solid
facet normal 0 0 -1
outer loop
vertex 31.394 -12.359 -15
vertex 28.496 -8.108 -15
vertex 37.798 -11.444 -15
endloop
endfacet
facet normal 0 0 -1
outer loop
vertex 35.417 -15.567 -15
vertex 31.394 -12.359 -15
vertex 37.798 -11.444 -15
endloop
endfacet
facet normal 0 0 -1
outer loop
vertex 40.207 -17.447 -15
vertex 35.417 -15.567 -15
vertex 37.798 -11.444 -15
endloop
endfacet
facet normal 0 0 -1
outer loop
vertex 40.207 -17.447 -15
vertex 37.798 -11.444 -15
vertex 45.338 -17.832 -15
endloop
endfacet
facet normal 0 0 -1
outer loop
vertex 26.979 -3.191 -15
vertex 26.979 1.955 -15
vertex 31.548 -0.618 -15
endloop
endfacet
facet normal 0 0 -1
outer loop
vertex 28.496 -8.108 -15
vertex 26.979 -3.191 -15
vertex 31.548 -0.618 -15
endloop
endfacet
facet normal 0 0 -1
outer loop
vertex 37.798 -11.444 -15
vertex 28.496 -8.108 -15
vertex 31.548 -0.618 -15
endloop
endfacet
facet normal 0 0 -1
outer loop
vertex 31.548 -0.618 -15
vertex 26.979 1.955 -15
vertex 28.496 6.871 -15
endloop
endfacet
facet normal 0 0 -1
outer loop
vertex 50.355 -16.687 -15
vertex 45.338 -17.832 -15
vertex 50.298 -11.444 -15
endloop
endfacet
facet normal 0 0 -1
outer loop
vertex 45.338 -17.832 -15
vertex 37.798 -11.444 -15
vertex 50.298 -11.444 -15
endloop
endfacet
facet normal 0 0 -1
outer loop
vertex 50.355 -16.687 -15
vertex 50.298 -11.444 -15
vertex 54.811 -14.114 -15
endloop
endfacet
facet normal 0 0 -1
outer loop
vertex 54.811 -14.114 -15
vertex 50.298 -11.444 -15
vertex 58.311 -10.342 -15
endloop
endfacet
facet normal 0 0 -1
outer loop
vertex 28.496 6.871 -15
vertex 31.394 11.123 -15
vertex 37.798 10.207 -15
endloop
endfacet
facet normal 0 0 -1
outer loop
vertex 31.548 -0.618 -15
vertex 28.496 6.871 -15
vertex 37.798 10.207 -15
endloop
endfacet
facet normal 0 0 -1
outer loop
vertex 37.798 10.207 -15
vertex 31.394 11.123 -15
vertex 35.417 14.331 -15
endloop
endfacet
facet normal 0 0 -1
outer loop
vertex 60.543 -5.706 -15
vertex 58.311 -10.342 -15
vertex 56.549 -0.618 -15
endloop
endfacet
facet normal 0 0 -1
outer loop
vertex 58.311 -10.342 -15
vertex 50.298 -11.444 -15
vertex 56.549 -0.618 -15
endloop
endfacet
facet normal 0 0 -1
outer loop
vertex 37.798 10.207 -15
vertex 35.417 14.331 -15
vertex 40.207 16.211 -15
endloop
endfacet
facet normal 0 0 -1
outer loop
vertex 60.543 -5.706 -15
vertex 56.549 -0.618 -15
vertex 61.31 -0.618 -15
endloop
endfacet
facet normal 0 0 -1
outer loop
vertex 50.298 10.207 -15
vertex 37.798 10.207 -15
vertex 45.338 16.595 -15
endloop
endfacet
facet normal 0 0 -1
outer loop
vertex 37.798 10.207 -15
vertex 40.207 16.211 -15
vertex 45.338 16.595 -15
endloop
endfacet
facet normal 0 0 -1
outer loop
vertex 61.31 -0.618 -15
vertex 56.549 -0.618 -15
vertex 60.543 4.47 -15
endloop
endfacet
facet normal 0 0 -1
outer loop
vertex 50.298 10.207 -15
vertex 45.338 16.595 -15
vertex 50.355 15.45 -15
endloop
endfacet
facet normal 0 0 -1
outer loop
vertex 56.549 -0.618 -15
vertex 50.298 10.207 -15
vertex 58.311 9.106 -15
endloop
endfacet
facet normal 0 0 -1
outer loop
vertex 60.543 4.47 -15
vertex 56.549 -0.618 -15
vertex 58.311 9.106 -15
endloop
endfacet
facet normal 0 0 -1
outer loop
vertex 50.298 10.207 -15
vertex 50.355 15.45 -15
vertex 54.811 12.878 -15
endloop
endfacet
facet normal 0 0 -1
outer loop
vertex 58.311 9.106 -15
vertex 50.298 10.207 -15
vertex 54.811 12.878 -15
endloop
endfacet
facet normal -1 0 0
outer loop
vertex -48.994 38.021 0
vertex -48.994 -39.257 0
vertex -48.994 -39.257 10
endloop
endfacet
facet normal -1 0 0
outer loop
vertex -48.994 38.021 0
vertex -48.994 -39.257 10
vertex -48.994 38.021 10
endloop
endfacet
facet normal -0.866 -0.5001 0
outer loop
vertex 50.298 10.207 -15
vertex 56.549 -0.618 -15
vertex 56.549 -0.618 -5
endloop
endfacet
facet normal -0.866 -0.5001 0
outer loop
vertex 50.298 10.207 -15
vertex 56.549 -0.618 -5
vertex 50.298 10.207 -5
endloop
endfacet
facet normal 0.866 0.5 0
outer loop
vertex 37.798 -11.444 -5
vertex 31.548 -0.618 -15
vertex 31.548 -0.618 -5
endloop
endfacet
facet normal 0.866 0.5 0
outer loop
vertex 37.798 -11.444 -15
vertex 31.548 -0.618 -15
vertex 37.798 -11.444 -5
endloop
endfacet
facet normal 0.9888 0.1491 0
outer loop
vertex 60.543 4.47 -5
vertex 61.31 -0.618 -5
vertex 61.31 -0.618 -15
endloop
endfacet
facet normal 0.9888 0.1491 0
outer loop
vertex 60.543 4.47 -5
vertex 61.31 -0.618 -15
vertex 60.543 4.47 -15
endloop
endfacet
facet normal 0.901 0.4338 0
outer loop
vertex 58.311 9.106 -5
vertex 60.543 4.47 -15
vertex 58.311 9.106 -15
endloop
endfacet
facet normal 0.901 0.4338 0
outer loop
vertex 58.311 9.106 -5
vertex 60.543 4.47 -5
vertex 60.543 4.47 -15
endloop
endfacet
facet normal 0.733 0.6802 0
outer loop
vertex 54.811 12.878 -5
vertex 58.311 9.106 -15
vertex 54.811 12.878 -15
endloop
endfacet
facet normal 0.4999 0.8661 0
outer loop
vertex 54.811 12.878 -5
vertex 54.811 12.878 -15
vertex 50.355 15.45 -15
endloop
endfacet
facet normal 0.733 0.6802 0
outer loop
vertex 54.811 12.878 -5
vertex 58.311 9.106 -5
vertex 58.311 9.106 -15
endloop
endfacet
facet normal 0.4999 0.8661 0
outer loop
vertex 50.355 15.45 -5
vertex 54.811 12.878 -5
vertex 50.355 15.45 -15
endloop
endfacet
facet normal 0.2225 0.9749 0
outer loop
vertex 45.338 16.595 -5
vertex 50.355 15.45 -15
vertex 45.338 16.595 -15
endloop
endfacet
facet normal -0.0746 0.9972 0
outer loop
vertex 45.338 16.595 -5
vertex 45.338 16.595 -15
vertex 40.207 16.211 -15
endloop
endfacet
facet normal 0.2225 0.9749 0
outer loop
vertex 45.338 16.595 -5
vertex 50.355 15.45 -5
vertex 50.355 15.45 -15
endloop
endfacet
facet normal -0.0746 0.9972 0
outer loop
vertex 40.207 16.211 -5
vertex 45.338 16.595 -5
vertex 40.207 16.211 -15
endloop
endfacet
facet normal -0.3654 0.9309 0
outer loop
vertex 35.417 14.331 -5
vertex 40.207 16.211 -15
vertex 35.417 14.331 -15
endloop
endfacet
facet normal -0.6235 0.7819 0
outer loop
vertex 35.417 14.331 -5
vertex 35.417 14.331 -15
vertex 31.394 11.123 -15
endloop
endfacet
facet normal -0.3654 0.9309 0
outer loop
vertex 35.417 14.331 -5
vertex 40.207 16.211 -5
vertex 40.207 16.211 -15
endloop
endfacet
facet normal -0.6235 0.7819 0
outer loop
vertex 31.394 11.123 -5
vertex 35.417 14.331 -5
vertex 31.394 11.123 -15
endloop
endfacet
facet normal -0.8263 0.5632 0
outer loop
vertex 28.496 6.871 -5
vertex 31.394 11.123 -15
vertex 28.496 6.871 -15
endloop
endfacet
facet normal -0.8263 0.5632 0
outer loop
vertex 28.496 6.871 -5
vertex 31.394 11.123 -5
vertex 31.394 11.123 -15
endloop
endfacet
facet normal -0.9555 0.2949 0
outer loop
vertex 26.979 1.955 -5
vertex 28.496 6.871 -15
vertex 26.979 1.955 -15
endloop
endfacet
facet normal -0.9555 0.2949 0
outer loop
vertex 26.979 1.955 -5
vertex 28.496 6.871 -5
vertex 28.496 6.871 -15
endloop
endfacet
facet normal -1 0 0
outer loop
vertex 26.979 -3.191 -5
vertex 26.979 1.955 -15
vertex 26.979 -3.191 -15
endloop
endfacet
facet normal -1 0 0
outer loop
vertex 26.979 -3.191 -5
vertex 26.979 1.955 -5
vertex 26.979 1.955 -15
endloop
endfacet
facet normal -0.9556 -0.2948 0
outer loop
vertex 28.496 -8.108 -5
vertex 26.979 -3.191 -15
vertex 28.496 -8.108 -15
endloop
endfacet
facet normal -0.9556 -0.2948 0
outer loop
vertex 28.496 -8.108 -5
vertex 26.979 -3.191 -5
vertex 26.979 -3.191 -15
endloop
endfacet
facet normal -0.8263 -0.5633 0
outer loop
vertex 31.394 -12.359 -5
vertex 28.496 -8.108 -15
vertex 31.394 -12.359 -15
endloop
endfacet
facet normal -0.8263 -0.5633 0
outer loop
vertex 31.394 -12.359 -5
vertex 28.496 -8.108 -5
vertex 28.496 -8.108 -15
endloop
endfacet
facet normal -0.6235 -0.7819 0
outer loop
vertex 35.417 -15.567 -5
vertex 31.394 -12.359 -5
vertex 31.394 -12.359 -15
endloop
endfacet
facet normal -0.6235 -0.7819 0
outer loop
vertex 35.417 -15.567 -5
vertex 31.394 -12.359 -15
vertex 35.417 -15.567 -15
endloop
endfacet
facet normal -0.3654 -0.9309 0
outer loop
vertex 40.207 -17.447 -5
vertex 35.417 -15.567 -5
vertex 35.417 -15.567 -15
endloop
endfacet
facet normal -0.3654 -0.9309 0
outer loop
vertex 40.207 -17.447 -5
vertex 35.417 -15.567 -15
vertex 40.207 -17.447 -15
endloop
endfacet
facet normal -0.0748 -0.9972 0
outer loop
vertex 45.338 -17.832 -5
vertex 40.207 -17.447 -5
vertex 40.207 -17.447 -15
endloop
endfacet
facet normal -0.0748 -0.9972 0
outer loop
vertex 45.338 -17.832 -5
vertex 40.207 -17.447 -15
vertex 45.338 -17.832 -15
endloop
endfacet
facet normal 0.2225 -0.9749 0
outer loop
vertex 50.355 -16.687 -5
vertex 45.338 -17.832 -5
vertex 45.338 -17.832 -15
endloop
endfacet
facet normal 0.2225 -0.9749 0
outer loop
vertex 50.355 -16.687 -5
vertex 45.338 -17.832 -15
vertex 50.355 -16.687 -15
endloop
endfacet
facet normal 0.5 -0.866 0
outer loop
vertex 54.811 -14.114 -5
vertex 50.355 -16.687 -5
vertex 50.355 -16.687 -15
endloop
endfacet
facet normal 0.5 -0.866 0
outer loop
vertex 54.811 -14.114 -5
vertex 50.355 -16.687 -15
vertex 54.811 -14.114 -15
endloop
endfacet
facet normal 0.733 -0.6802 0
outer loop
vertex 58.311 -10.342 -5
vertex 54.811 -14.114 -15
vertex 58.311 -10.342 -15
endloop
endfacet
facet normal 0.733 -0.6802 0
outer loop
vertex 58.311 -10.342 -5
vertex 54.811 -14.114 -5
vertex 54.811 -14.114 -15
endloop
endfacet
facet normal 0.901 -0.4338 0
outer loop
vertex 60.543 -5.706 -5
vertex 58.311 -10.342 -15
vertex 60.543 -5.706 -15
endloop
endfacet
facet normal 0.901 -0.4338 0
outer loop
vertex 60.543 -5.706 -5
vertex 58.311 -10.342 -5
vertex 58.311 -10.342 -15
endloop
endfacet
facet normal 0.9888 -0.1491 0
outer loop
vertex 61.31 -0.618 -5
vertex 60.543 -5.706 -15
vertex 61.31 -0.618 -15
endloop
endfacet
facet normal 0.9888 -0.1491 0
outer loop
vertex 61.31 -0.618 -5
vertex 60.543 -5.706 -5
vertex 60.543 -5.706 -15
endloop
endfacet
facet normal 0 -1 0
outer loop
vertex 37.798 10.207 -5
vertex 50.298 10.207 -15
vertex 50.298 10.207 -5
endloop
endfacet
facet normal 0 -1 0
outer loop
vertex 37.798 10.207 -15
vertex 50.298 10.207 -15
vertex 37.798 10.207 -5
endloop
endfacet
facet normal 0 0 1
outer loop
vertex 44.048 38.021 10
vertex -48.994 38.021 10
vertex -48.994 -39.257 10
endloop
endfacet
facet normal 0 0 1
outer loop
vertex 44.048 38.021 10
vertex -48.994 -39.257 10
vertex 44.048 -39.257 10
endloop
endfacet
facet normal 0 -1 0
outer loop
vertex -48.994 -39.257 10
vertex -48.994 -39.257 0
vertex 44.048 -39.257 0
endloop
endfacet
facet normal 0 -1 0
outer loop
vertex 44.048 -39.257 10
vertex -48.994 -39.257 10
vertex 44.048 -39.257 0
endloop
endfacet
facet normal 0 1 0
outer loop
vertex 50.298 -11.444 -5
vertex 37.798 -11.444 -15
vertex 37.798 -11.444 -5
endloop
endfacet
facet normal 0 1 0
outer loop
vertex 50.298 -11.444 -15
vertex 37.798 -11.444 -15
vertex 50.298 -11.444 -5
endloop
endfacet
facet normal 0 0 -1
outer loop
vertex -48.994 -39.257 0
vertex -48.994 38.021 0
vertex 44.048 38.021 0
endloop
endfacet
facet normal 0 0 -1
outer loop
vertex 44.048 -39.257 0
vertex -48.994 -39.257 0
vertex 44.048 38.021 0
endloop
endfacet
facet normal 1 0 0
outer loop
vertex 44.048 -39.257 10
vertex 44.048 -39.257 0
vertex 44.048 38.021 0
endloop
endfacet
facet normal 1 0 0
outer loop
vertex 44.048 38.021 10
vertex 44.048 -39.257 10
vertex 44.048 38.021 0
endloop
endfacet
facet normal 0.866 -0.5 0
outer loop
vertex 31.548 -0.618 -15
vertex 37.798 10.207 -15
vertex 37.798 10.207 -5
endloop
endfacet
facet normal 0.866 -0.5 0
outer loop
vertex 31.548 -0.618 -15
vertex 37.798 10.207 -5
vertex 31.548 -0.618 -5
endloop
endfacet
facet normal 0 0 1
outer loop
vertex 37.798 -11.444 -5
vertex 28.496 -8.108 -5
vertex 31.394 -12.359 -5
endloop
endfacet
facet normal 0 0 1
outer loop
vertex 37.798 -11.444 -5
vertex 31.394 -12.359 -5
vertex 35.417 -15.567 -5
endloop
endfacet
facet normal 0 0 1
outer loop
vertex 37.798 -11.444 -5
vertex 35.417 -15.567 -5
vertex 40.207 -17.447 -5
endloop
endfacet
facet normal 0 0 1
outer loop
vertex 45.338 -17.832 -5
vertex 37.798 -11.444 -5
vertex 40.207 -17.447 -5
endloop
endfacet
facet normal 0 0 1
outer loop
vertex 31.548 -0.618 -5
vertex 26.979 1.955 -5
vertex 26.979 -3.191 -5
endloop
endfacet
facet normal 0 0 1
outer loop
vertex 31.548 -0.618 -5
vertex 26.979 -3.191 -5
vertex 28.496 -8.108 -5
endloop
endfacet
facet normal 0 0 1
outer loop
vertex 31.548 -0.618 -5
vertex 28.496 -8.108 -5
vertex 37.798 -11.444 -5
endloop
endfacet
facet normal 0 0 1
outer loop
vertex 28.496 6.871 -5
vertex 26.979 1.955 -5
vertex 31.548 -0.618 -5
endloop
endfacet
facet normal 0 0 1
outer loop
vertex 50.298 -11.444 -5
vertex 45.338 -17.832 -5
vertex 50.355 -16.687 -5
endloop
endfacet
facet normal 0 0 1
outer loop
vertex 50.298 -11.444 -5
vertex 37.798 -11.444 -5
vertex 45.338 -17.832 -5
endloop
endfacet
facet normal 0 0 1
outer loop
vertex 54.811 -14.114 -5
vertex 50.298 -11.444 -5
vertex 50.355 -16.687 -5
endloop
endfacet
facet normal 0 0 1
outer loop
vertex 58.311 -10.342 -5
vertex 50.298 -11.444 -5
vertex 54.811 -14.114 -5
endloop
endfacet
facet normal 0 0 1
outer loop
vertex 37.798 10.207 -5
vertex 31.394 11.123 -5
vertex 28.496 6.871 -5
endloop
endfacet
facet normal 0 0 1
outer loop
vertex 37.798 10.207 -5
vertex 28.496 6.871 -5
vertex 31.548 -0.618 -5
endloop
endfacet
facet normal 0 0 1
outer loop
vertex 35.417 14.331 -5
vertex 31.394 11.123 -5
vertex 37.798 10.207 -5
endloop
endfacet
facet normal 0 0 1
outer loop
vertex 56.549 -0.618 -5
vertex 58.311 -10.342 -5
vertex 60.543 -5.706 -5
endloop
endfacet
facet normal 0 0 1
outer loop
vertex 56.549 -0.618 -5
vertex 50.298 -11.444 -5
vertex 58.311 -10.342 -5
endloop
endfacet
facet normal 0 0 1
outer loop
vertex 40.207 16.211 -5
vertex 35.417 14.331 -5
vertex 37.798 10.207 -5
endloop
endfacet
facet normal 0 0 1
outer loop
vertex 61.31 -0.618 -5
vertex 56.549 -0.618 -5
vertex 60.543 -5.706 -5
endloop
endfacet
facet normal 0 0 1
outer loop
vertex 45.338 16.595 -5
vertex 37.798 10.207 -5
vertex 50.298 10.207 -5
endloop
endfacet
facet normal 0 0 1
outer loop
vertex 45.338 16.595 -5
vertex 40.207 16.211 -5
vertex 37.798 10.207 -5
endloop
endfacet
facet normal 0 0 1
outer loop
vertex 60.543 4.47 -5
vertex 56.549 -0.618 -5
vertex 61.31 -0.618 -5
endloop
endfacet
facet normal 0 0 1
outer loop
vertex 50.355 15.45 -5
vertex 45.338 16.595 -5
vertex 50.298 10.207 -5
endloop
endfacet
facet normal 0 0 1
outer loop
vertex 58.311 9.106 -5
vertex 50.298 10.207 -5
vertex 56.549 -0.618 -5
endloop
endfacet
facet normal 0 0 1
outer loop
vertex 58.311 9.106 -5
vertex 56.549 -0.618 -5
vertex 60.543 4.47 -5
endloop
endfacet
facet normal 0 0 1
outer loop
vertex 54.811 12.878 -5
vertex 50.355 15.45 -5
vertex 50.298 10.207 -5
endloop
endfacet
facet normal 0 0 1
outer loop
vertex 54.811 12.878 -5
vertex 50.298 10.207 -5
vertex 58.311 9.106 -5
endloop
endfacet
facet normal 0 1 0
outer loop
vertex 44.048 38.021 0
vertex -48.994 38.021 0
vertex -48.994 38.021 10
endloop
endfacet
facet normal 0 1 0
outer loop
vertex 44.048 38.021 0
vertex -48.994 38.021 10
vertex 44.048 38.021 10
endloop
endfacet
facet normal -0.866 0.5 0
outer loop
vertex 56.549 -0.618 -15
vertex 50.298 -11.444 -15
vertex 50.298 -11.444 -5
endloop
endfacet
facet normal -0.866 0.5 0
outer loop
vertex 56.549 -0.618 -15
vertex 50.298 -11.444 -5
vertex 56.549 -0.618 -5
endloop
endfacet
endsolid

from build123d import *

# Parameters (mm, degrees)
F_1_FR_W                       = 93.042145165
F_1_FR_H                       = 77.277529207
EXTRUDE_1_DEPTH                = 10
SKETCH_5_R                     = 17.261773312
EXTRUDE_2_DEPTH                = 10
SPLIT_BODIES_1_SURFACE_1_BACK  = 137.981
SPLIT_BODIES_1_SURFACE_1_DEPTH = 275.962


with BuildPart() as part:
    # Эскиз1_fr → Бобышка-Вытянуть1 (new body)
    with BuildSketch(Plane.XY):
        with Locations((-2.472880935, -0.618220234)):
            Rectangle(F_1_FR_W, F_1_FR_H)
    extrude(amount=EXTRUDE_1_DEPTH)


with BuildPart() as body_2:
    # Эскиз5 → Бобышка-Вытянуть2 (new body)
    with BuildSketch(Plane.XY.offset(-5)):
        with Locations((44.048191648, -0.618220234)):
            Circle(SKETCH_5_R)
    extrude(amount=-EXTRUDE_2_DEPTH)

    # Split Bodies 1: cut with a surface, the side behind it stays
    # Split Bodies 1 surface: a surface, the sketch's curves swept straight by 275.962 mm
    with BuildLine(Plane.XY.offset(20).offset(-SPLIT_BODIES_1_SURFACE_1_BACK), mode=Mode.PRIVATE) as split_bodies_1_surface_1_path:
        Line((50.298388751, -11.443879173), (56.548585854, -0.618220234))
        Line((56.548585854, -0.618220234), (50.298388751, 10.207438706))
        Line((50.298388751, 10.207438706), (37.797994545, 10.207438706))
        Line((37.797994545, 10.207438706), (31.547797442, -0.618220234))
        Line((31.547797442, -0.618220234), (37.797994545, -11.443879173))
        Line((37.797994545, -11.443879173), (50.298388751, -11.443879173))
    split_bodies_1_surface_1 = Shell.extrude(split_bodies_1_surface_1_path.wire(), (0 * SPLIT_BODIES_1_SURFACE_1_DEPTH, 0 * SPLIT_BODIES_1_SURFACE_1_DEPTH, 1 * SPLIT_BODIES_1_SURFACE_1_DEPTH))
    split(bisect_by=split_bodies_1_surface_1, keep=Keep.BOTTOM)


solid = Compound([part.part, body_2.part])
